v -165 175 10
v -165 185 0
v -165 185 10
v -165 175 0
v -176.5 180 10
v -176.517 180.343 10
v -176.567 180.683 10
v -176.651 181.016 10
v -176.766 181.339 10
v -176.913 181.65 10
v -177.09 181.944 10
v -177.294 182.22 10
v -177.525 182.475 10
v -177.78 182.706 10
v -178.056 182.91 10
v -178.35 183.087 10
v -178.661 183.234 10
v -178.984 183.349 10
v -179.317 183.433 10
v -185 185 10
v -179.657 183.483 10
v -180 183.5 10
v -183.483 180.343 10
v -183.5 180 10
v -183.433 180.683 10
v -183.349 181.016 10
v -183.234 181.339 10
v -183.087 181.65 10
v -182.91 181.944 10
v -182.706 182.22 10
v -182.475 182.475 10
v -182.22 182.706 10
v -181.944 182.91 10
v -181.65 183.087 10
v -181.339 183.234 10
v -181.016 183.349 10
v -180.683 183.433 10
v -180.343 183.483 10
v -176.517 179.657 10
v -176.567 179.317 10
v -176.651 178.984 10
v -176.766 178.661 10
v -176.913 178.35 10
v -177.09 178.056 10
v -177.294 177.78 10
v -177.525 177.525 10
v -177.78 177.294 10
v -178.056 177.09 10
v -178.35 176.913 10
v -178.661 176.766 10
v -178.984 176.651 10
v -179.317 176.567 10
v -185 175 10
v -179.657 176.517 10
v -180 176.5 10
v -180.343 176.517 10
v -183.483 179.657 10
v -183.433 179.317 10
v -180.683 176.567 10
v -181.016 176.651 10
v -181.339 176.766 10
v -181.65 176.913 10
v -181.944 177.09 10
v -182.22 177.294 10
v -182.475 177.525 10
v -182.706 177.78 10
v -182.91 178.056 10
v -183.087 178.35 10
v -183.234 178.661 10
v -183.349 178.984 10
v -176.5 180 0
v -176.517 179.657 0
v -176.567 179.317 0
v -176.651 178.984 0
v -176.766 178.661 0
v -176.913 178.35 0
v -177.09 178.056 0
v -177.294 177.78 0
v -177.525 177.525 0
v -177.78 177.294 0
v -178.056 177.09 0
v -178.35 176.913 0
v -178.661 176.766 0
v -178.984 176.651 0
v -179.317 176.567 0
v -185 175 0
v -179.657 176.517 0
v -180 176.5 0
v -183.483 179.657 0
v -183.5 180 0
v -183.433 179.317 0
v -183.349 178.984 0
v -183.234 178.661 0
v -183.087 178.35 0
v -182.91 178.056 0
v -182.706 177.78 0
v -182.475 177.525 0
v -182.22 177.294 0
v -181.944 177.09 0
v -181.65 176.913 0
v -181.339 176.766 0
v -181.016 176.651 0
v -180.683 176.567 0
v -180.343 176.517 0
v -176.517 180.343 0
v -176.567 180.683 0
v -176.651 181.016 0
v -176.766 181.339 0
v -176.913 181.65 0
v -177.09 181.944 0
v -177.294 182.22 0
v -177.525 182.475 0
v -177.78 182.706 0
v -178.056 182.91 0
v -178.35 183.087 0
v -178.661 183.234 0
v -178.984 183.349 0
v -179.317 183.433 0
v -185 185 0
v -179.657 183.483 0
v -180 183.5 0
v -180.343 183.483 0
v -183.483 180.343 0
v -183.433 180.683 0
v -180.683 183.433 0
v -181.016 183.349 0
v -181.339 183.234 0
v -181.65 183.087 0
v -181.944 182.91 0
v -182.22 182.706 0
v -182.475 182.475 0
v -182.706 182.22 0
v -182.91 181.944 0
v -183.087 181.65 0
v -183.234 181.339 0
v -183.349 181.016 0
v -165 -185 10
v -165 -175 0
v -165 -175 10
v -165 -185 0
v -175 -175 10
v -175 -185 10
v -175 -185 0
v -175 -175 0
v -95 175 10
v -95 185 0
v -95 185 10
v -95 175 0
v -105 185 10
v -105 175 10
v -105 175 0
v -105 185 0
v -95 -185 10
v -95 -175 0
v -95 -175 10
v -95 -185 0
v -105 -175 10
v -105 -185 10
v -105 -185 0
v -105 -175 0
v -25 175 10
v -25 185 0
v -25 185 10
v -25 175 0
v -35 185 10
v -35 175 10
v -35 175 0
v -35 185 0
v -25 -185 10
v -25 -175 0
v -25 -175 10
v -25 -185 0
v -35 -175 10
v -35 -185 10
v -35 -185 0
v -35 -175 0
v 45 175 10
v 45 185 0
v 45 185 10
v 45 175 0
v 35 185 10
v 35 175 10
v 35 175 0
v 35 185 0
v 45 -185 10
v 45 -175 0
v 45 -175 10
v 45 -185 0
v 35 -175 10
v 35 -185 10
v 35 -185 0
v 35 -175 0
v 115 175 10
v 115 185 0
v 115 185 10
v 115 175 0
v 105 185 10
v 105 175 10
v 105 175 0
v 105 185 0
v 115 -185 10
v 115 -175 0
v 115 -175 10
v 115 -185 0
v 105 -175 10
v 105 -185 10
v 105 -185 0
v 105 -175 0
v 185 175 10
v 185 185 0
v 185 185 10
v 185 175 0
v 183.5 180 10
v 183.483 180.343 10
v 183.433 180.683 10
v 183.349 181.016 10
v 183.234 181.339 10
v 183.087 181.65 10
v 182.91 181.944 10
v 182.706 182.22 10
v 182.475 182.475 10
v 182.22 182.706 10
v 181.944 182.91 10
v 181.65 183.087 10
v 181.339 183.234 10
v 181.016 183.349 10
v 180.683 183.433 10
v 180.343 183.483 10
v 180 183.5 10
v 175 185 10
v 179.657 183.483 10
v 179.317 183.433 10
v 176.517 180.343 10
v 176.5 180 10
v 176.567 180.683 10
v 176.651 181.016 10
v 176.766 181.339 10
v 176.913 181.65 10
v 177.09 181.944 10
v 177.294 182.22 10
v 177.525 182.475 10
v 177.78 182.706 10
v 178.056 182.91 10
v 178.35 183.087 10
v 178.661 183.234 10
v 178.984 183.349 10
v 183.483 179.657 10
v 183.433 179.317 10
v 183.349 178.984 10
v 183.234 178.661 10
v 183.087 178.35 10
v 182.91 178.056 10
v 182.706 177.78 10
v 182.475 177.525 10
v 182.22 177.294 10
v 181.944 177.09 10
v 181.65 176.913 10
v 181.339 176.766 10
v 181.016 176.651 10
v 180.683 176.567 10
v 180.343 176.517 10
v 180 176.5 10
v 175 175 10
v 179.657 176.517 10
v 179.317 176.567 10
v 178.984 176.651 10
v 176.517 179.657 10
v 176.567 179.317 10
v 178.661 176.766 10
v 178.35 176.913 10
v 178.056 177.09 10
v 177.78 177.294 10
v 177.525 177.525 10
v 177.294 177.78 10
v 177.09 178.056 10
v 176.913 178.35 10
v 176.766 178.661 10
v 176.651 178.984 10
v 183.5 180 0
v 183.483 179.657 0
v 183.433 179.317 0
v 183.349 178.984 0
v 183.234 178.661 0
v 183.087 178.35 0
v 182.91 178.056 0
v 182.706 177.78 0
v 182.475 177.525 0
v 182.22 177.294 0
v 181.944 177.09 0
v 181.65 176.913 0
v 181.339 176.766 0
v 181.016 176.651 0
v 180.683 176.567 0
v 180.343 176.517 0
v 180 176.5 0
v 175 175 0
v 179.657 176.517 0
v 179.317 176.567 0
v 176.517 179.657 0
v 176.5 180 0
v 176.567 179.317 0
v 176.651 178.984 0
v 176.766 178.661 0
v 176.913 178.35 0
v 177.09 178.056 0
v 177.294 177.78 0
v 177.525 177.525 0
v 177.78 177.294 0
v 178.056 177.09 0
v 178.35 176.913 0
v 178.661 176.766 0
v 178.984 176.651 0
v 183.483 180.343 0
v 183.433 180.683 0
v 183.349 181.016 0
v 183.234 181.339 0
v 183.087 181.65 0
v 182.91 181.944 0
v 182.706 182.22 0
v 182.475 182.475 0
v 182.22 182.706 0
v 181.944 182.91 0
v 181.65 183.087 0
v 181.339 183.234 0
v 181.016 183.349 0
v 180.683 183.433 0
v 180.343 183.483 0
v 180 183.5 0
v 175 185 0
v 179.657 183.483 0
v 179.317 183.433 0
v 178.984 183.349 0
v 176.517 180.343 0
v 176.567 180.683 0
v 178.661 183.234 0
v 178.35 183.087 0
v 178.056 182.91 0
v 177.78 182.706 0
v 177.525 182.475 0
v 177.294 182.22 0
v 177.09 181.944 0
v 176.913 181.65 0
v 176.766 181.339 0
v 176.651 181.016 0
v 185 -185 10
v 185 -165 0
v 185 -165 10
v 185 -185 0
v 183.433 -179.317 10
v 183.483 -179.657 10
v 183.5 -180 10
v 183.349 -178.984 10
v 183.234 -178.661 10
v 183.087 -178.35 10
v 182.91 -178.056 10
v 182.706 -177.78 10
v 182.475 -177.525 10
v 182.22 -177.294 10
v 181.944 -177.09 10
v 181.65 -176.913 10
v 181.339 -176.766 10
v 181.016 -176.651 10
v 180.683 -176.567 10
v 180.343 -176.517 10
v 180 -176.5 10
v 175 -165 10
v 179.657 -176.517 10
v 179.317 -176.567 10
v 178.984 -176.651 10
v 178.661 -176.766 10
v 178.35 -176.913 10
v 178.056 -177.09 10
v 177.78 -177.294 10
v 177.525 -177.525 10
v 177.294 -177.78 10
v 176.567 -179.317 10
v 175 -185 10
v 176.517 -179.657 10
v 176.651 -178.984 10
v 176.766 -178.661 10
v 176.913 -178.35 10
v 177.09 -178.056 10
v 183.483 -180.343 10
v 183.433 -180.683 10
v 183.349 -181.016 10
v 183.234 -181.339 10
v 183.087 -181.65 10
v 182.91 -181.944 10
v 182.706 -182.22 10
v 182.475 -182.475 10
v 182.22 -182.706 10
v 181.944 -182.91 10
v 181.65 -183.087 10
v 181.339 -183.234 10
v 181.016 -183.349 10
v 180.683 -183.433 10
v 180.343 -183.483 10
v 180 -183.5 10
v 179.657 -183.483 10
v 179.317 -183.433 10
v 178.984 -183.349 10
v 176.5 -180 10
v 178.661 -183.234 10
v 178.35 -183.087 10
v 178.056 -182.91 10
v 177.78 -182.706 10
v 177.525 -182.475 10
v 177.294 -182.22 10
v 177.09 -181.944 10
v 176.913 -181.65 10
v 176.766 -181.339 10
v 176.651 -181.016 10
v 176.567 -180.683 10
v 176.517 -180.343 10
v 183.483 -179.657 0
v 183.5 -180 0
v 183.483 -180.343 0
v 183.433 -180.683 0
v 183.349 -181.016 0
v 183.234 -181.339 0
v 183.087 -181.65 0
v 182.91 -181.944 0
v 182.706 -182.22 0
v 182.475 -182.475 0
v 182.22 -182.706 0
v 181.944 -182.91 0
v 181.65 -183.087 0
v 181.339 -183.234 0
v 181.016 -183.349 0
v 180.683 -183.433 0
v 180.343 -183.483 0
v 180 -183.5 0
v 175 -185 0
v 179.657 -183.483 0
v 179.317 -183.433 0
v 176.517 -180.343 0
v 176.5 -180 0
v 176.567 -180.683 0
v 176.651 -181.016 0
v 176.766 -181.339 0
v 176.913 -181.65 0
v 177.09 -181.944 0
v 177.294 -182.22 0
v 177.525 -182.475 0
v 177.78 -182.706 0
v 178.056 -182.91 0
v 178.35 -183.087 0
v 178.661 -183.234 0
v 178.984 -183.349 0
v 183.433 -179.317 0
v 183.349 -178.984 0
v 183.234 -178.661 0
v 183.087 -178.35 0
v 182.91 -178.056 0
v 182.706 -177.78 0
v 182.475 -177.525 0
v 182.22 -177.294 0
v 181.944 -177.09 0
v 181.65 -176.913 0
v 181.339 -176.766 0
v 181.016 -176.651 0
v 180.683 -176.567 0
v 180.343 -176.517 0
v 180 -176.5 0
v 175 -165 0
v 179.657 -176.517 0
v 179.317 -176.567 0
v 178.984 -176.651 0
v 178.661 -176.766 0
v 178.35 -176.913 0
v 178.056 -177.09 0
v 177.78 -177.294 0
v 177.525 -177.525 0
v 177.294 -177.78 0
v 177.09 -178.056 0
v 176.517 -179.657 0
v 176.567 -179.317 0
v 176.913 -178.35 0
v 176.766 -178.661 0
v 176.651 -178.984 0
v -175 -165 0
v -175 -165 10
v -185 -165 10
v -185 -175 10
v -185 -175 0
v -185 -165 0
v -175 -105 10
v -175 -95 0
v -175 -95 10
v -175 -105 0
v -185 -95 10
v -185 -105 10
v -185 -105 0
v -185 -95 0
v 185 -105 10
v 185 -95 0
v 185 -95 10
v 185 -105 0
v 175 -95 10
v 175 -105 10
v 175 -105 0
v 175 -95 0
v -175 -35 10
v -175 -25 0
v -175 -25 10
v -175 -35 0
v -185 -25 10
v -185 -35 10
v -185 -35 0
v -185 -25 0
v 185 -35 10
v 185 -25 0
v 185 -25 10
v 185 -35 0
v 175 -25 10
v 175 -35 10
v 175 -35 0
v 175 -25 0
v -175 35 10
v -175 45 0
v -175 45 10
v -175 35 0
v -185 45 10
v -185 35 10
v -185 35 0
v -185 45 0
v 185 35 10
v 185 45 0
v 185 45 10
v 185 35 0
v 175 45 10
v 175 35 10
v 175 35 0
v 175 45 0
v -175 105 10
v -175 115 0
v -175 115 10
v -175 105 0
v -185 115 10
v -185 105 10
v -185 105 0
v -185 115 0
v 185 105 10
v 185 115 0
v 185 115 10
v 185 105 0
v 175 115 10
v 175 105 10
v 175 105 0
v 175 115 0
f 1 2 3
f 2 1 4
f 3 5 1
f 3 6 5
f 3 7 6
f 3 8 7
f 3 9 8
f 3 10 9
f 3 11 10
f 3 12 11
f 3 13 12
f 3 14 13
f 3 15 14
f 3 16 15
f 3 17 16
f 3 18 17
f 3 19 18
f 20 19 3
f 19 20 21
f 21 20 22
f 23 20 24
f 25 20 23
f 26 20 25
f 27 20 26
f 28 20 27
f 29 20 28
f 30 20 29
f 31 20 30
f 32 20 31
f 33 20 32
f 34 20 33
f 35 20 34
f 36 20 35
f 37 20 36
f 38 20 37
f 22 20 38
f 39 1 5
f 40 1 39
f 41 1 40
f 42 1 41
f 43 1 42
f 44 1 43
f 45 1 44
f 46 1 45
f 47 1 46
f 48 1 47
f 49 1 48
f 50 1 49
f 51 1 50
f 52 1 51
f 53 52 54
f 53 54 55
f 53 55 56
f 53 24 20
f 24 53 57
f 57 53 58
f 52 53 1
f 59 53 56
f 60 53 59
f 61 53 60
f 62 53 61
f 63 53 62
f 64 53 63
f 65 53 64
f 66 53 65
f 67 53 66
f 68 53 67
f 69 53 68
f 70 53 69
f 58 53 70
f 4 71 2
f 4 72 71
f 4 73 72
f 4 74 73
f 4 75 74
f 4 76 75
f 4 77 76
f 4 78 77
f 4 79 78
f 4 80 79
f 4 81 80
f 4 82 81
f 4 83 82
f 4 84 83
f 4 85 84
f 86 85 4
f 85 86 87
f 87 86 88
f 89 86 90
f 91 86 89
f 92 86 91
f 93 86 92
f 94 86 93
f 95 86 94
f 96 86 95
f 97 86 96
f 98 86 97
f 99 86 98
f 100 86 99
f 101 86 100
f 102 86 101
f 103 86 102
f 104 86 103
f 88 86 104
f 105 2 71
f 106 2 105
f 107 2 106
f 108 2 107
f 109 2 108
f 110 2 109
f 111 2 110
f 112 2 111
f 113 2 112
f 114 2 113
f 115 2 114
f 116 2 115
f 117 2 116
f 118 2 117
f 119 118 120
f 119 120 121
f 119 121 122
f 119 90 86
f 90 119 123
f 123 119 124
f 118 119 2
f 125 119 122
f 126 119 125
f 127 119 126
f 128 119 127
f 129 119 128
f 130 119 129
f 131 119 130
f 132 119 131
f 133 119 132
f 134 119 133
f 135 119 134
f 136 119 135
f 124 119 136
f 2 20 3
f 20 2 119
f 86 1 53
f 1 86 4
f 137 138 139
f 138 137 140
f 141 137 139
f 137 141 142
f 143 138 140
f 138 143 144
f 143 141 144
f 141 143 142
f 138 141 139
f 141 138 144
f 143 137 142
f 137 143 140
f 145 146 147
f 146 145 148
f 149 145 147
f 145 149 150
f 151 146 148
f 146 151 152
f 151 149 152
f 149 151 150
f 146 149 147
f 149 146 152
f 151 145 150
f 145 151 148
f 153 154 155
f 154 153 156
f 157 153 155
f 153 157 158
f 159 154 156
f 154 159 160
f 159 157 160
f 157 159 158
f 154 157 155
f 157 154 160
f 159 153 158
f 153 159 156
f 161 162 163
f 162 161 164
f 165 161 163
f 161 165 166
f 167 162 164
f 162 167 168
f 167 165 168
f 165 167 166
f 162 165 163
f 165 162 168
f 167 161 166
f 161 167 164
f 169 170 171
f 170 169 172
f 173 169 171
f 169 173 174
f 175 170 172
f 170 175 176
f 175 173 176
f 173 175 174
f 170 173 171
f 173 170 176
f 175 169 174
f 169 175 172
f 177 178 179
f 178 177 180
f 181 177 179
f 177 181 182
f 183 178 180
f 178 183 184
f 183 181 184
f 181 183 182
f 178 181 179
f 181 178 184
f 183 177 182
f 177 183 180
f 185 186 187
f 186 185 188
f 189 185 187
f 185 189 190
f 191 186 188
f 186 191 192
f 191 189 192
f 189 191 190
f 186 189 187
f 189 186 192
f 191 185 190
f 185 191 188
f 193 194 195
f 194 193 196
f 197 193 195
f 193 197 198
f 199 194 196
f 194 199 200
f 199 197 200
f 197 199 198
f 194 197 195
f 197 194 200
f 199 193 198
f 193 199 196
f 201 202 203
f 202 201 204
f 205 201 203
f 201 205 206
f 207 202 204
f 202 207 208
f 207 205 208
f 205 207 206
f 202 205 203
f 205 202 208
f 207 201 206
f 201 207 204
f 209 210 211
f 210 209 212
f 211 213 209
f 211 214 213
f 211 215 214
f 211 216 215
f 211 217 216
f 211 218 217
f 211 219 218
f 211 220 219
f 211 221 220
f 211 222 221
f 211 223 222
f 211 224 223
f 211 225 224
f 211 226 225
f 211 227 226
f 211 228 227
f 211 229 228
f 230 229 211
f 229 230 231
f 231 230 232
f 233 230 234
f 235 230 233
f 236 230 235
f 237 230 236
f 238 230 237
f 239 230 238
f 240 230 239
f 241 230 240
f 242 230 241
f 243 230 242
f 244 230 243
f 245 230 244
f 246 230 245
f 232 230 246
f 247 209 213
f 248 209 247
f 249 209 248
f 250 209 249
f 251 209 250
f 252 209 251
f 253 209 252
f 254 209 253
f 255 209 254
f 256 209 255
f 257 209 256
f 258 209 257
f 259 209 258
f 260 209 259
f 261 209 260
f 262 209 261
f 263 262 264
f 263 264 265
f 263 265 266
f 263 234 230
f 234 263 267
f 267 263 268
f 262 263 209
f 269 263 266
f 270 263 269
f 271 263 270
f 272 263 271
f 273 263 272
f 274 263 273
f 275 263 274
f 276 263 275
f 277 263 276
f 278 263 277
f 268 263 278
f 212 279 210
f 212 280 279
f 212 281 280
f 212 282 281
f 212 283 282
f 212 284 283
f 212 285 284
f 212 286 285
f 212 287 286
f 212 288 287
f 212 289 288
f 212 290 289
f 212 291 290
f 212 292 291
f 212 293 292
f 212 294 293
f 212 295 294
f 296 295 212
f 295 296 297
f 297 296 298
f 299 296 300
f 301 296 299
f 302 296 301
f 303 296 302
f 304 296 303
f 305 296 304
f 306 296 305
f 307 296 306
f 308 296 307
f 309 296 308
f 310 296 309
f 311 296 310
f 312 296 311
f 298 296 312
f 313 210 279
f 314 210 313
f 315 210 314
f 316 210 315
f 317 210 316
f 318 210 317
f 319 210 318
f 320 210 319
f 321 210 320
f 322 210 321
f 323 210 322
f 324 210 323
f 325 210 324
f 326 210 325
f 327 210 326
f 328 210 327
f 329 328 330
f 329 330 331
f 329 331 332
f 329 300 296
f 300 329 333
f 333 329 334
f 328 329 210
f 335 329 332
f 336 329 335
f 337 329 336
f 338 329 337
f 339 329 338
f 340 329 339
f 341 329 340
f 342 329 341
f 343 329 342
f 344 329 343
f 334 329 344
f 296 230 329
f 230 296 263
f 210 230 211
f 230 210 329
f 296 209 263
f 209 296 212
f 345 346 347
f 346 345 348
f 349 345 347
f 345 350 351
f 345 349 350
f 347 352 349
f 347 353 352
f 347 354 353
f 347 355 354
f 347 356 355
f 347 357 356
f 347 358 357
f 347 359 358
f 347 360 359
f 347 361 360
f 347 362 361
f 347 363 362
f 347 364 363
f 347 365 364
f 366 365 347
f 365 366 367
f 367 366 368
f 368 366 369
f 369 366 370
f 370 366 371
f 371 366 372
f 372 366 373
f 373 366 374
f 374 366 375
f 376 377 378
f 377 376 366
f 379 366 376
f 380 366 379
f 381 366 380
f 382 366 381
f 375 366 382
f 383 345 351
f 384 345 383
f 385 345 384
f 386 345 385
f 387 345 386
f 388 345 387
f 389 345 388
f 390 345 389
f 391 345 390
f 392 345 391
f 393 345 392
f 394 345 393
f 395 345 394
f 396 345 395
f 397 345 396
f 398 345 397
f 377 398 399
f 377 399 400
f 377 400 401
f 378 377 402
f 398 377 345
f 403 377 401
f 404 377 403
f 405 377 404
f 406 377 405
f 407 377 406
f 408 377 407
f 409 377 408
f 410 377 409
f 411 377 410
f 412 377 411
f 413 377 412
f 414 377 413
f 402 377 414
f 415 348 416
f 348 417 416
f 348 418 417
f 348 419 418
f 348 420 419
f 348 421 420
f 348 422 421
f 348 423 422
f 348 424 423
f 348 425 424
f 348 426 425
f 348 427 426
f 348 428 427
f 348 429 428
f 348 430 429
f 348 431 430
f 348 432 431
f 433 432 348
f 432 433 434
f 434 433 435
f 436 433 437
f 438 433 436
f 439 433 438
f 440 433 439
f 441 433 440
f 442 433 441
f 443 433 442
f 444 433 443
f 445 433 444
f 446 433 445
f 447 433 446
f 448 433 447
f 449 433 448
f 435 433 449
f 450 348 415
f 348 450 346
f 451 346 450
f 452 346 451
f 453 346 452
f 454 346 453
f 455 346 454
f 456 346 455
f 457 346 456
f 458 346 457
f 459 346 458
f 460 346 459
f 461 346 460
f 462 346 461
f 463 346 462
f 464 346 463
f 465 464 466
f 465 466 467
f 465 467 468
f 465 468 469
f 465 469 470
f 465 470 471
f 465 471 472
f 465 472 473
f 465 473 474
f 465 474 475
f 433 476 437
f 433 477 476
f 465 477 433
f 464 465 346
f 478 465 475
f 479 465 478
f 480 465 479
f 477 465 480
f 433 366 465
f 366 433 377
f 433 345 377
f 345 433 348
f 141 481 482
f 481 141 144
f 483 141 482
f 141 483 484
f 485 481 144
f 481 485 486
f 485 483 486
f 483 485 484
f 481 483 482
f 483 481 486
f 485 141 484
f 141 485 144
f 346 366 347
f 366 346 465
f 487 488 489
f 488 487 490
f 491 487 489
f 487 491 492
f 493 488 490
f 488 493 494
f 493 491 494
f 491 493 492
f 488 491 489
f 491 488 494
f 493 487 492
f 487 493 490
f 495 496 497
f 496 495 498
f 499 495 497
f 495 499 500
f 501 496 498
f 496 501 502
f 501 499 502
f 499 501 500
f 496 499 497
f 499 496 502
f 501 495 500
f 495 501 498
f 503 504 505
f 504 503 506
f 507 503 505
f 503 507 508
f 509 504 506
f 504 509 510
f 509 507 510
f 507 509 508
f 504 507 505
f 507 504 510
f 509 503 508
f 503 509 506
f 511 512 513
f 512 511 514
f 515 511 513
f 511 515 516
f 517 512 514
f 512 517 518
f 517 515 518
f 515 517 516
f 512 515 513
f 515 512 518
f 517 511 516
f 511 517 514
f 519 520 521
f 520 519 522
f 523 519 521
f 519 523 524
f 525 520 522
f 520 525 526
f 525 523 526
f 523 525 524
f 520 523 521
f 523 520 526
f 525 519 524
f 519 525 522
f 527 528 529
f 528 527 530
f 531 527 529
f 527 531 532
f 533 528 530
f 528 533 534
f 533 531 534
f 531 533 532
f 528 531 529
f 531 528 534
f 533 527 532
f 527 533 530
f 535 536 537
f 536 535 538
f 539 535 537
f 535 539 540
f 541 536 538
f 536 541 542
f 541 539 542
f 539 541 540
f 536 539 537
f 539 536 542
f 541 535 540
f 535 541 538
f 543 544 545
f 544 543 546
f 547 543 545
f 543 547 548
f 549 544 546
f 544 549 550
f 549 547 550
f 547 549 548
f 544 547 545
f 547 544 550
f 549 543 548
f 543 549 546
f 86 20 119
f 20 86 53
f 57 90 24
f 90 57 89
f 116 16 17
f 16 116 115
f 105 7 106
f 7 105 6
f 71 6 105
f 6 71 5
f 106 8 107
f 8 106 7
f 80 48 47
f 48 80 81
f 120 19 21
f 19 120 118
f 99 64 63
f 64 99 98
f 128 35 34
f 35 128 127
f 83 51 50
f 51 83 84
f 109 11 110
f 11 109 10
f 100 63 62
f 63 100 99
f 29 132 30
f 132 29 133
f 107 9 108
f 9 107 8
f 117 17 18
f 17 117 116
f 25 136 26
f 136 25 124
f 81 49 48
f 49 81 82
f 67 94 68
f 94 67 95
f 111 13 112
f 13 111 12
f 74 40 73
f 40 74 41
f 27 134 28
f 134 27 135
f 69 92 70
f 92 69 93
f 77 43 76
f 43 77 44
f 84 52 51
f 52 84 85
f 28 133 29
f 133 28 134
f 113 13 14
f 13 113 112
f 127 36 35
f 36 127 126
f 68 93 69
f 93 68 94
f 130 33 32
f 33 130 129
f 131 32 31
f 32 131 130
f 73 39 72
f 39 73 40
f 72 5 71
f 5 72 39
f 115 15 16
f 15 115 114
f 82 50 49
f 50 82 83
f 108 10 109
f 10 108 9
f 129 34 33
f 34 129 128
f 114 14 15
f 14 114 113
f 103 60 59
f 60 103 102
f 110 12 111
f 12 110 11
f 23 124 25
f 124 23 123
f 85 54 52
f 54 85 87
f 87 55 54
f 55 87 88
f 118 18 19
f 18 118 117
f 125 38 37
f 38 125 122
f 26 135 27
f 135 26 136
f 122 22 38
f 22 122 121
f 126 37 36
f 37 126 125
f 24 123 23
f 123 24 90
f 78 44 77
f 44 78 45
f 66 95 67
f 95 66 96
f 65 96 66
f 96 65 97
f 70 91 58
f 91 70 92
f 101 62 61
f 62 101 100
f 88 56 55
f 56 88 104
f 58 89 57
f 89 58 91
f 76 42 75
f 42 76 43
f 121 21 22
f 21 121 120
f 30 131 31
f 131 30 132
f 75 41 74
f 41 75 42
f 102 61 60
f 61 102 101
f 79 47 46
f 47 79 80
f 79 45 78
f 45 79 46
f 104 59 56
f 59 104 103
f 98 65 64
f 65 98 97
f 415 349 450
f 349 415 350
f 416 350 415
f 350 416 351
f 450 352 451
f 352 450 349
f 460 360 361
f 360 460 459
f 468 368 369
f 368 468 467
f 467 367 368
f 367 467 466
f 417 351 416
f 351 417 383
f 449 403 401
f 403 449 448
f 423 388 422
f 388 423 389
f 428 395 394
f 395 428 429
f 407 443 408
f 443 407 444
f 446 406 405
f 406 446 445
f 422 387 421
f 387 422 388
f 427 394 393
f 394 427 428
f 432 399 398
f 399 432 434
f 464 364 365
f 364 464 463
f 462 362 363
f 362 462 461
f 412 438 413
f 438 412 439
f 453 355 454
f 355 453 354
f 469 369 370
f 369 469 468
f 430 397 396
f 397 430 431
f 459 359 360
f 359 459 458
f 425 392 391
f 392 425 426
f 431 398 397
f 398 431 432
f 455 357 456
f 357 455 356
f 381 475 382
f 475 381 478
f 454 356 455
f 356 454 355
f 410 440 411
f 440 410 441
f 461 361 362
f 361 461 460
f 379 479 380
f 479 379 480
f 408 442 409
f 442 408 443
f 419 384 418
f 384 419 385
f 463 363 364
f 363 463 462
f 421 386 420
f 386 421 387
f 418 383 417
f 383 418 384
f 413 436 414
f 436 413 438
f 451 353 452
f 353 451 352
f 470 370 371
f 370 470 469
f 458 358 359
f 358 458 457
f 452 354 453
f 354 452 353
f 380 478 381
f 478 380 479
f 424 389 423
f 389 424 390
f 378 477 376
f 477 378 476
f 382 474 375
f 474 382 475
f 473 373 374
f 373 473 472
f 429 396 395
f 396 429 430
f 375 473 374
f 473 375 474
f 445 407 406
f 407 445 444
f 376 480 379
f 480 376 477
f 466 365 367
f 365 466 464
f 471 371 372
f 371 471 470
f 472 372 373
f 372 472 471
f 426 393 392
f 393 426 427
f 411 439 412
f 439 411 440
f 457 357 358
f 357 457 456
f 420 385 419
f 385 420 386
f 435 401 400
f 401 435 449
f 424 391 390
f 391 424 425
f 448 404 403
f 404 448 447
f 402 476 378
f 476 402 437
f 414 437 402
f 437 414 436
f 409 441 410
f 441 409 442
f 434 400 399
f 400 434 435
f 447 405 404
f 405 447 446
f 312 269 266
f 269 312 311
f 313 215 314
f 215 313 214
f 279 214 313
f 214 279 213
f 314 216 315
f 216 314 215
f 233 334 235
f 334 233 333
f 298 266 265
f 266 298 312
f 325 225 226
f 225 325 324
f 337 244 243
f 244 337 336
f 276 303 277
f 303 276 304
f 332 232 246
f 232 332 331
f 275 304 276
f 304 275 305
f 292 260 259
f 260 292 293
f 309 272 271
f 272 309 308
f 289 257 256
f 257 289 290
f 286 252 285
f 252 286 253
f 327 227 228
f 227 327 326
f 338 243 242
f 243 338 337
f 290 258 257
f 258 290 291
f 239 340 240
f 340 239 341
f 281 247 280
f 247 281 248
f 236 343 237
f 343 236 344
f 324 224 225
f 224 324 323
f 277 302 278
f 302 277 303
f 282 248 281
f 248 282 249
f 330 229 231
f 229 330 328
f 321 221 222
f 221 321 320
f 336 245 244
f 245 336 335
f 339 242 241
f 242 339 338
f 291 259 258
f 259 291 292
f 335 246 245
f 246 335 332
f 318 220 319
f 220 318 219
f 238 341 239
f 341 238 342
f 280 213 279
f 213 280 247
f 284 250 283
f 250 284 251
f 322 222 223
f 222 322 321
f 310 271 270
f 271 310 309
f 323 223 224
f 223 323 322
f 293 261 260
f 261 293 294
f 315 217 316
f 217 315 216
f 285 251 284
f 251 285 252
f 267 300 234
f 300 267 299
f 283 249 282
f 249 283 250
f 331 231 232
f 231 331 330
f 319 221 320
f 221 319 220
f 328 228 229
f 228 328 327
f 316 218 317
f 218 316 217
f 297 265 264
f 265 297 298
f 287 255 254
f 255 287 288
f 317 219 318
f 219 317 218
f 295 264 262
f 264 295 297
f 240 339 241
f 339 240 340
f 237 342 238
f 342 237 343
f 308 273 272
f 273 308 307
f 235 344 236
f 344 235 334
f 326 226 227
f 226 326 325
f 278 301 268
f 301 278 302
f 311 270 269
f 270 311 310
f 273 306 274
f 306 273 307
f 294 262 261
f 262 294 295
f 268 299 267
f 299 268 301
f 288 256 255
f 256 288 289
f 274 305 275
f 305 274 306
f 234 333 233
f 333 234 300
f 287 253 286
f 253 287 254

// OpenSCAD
// ring_45.scad - ring index 45 (z bottom = 450 mm)
$fn = 64; bar = 10; half_b = bar/2; outer = 370; half_outer = outer/2;
front_y = 180; back_y = -180; left_x = -180; right_x = 180;
x_centers = [-170, -100, -30, 40, 110, 180];
z_centers = [5, 85, 155, 225, 295, 365, 435, 505, 575, 645, 715]; ring_z = 450;
module place_box(cx, cy, sx, sy) { translate([cx - sx/2, cy - sy/2, 0]) cube([sx, sy, bar]); }

difference() { union() {
    for (x = x_centers) { place_box(x, front_y, bar, bar); place_box(x, back_y, bar, bar); }
    for (y = x_centers) { place_box(left_x, y, bar, bar); place_box(right_x, y, bar, bar); }
    for (zc = z_centers) if ((zc - half_b < ring_z + bar) && (zc + half_b > ring_z)) {
        translate([-half_outer, front_y - half_b, 0]) cube([outer, bar, bar]);
        translate([-half_outer, back_y - half_b, 0])  cube([outer, bar, bar]);
        translate([left_x - half_b, -half_outer, 0])  cube([bar, outer, bar]);
        translate([right_x - half_b, -half_outer, 0]) cube([bar, outer, bar]);
    }
  }
  for (cx = [-180, 180]) for (cy = [-180, 180]) translate([cx, cy, 0]) cylinder(h = bar, r = 3.5, $fn = 64);
}
